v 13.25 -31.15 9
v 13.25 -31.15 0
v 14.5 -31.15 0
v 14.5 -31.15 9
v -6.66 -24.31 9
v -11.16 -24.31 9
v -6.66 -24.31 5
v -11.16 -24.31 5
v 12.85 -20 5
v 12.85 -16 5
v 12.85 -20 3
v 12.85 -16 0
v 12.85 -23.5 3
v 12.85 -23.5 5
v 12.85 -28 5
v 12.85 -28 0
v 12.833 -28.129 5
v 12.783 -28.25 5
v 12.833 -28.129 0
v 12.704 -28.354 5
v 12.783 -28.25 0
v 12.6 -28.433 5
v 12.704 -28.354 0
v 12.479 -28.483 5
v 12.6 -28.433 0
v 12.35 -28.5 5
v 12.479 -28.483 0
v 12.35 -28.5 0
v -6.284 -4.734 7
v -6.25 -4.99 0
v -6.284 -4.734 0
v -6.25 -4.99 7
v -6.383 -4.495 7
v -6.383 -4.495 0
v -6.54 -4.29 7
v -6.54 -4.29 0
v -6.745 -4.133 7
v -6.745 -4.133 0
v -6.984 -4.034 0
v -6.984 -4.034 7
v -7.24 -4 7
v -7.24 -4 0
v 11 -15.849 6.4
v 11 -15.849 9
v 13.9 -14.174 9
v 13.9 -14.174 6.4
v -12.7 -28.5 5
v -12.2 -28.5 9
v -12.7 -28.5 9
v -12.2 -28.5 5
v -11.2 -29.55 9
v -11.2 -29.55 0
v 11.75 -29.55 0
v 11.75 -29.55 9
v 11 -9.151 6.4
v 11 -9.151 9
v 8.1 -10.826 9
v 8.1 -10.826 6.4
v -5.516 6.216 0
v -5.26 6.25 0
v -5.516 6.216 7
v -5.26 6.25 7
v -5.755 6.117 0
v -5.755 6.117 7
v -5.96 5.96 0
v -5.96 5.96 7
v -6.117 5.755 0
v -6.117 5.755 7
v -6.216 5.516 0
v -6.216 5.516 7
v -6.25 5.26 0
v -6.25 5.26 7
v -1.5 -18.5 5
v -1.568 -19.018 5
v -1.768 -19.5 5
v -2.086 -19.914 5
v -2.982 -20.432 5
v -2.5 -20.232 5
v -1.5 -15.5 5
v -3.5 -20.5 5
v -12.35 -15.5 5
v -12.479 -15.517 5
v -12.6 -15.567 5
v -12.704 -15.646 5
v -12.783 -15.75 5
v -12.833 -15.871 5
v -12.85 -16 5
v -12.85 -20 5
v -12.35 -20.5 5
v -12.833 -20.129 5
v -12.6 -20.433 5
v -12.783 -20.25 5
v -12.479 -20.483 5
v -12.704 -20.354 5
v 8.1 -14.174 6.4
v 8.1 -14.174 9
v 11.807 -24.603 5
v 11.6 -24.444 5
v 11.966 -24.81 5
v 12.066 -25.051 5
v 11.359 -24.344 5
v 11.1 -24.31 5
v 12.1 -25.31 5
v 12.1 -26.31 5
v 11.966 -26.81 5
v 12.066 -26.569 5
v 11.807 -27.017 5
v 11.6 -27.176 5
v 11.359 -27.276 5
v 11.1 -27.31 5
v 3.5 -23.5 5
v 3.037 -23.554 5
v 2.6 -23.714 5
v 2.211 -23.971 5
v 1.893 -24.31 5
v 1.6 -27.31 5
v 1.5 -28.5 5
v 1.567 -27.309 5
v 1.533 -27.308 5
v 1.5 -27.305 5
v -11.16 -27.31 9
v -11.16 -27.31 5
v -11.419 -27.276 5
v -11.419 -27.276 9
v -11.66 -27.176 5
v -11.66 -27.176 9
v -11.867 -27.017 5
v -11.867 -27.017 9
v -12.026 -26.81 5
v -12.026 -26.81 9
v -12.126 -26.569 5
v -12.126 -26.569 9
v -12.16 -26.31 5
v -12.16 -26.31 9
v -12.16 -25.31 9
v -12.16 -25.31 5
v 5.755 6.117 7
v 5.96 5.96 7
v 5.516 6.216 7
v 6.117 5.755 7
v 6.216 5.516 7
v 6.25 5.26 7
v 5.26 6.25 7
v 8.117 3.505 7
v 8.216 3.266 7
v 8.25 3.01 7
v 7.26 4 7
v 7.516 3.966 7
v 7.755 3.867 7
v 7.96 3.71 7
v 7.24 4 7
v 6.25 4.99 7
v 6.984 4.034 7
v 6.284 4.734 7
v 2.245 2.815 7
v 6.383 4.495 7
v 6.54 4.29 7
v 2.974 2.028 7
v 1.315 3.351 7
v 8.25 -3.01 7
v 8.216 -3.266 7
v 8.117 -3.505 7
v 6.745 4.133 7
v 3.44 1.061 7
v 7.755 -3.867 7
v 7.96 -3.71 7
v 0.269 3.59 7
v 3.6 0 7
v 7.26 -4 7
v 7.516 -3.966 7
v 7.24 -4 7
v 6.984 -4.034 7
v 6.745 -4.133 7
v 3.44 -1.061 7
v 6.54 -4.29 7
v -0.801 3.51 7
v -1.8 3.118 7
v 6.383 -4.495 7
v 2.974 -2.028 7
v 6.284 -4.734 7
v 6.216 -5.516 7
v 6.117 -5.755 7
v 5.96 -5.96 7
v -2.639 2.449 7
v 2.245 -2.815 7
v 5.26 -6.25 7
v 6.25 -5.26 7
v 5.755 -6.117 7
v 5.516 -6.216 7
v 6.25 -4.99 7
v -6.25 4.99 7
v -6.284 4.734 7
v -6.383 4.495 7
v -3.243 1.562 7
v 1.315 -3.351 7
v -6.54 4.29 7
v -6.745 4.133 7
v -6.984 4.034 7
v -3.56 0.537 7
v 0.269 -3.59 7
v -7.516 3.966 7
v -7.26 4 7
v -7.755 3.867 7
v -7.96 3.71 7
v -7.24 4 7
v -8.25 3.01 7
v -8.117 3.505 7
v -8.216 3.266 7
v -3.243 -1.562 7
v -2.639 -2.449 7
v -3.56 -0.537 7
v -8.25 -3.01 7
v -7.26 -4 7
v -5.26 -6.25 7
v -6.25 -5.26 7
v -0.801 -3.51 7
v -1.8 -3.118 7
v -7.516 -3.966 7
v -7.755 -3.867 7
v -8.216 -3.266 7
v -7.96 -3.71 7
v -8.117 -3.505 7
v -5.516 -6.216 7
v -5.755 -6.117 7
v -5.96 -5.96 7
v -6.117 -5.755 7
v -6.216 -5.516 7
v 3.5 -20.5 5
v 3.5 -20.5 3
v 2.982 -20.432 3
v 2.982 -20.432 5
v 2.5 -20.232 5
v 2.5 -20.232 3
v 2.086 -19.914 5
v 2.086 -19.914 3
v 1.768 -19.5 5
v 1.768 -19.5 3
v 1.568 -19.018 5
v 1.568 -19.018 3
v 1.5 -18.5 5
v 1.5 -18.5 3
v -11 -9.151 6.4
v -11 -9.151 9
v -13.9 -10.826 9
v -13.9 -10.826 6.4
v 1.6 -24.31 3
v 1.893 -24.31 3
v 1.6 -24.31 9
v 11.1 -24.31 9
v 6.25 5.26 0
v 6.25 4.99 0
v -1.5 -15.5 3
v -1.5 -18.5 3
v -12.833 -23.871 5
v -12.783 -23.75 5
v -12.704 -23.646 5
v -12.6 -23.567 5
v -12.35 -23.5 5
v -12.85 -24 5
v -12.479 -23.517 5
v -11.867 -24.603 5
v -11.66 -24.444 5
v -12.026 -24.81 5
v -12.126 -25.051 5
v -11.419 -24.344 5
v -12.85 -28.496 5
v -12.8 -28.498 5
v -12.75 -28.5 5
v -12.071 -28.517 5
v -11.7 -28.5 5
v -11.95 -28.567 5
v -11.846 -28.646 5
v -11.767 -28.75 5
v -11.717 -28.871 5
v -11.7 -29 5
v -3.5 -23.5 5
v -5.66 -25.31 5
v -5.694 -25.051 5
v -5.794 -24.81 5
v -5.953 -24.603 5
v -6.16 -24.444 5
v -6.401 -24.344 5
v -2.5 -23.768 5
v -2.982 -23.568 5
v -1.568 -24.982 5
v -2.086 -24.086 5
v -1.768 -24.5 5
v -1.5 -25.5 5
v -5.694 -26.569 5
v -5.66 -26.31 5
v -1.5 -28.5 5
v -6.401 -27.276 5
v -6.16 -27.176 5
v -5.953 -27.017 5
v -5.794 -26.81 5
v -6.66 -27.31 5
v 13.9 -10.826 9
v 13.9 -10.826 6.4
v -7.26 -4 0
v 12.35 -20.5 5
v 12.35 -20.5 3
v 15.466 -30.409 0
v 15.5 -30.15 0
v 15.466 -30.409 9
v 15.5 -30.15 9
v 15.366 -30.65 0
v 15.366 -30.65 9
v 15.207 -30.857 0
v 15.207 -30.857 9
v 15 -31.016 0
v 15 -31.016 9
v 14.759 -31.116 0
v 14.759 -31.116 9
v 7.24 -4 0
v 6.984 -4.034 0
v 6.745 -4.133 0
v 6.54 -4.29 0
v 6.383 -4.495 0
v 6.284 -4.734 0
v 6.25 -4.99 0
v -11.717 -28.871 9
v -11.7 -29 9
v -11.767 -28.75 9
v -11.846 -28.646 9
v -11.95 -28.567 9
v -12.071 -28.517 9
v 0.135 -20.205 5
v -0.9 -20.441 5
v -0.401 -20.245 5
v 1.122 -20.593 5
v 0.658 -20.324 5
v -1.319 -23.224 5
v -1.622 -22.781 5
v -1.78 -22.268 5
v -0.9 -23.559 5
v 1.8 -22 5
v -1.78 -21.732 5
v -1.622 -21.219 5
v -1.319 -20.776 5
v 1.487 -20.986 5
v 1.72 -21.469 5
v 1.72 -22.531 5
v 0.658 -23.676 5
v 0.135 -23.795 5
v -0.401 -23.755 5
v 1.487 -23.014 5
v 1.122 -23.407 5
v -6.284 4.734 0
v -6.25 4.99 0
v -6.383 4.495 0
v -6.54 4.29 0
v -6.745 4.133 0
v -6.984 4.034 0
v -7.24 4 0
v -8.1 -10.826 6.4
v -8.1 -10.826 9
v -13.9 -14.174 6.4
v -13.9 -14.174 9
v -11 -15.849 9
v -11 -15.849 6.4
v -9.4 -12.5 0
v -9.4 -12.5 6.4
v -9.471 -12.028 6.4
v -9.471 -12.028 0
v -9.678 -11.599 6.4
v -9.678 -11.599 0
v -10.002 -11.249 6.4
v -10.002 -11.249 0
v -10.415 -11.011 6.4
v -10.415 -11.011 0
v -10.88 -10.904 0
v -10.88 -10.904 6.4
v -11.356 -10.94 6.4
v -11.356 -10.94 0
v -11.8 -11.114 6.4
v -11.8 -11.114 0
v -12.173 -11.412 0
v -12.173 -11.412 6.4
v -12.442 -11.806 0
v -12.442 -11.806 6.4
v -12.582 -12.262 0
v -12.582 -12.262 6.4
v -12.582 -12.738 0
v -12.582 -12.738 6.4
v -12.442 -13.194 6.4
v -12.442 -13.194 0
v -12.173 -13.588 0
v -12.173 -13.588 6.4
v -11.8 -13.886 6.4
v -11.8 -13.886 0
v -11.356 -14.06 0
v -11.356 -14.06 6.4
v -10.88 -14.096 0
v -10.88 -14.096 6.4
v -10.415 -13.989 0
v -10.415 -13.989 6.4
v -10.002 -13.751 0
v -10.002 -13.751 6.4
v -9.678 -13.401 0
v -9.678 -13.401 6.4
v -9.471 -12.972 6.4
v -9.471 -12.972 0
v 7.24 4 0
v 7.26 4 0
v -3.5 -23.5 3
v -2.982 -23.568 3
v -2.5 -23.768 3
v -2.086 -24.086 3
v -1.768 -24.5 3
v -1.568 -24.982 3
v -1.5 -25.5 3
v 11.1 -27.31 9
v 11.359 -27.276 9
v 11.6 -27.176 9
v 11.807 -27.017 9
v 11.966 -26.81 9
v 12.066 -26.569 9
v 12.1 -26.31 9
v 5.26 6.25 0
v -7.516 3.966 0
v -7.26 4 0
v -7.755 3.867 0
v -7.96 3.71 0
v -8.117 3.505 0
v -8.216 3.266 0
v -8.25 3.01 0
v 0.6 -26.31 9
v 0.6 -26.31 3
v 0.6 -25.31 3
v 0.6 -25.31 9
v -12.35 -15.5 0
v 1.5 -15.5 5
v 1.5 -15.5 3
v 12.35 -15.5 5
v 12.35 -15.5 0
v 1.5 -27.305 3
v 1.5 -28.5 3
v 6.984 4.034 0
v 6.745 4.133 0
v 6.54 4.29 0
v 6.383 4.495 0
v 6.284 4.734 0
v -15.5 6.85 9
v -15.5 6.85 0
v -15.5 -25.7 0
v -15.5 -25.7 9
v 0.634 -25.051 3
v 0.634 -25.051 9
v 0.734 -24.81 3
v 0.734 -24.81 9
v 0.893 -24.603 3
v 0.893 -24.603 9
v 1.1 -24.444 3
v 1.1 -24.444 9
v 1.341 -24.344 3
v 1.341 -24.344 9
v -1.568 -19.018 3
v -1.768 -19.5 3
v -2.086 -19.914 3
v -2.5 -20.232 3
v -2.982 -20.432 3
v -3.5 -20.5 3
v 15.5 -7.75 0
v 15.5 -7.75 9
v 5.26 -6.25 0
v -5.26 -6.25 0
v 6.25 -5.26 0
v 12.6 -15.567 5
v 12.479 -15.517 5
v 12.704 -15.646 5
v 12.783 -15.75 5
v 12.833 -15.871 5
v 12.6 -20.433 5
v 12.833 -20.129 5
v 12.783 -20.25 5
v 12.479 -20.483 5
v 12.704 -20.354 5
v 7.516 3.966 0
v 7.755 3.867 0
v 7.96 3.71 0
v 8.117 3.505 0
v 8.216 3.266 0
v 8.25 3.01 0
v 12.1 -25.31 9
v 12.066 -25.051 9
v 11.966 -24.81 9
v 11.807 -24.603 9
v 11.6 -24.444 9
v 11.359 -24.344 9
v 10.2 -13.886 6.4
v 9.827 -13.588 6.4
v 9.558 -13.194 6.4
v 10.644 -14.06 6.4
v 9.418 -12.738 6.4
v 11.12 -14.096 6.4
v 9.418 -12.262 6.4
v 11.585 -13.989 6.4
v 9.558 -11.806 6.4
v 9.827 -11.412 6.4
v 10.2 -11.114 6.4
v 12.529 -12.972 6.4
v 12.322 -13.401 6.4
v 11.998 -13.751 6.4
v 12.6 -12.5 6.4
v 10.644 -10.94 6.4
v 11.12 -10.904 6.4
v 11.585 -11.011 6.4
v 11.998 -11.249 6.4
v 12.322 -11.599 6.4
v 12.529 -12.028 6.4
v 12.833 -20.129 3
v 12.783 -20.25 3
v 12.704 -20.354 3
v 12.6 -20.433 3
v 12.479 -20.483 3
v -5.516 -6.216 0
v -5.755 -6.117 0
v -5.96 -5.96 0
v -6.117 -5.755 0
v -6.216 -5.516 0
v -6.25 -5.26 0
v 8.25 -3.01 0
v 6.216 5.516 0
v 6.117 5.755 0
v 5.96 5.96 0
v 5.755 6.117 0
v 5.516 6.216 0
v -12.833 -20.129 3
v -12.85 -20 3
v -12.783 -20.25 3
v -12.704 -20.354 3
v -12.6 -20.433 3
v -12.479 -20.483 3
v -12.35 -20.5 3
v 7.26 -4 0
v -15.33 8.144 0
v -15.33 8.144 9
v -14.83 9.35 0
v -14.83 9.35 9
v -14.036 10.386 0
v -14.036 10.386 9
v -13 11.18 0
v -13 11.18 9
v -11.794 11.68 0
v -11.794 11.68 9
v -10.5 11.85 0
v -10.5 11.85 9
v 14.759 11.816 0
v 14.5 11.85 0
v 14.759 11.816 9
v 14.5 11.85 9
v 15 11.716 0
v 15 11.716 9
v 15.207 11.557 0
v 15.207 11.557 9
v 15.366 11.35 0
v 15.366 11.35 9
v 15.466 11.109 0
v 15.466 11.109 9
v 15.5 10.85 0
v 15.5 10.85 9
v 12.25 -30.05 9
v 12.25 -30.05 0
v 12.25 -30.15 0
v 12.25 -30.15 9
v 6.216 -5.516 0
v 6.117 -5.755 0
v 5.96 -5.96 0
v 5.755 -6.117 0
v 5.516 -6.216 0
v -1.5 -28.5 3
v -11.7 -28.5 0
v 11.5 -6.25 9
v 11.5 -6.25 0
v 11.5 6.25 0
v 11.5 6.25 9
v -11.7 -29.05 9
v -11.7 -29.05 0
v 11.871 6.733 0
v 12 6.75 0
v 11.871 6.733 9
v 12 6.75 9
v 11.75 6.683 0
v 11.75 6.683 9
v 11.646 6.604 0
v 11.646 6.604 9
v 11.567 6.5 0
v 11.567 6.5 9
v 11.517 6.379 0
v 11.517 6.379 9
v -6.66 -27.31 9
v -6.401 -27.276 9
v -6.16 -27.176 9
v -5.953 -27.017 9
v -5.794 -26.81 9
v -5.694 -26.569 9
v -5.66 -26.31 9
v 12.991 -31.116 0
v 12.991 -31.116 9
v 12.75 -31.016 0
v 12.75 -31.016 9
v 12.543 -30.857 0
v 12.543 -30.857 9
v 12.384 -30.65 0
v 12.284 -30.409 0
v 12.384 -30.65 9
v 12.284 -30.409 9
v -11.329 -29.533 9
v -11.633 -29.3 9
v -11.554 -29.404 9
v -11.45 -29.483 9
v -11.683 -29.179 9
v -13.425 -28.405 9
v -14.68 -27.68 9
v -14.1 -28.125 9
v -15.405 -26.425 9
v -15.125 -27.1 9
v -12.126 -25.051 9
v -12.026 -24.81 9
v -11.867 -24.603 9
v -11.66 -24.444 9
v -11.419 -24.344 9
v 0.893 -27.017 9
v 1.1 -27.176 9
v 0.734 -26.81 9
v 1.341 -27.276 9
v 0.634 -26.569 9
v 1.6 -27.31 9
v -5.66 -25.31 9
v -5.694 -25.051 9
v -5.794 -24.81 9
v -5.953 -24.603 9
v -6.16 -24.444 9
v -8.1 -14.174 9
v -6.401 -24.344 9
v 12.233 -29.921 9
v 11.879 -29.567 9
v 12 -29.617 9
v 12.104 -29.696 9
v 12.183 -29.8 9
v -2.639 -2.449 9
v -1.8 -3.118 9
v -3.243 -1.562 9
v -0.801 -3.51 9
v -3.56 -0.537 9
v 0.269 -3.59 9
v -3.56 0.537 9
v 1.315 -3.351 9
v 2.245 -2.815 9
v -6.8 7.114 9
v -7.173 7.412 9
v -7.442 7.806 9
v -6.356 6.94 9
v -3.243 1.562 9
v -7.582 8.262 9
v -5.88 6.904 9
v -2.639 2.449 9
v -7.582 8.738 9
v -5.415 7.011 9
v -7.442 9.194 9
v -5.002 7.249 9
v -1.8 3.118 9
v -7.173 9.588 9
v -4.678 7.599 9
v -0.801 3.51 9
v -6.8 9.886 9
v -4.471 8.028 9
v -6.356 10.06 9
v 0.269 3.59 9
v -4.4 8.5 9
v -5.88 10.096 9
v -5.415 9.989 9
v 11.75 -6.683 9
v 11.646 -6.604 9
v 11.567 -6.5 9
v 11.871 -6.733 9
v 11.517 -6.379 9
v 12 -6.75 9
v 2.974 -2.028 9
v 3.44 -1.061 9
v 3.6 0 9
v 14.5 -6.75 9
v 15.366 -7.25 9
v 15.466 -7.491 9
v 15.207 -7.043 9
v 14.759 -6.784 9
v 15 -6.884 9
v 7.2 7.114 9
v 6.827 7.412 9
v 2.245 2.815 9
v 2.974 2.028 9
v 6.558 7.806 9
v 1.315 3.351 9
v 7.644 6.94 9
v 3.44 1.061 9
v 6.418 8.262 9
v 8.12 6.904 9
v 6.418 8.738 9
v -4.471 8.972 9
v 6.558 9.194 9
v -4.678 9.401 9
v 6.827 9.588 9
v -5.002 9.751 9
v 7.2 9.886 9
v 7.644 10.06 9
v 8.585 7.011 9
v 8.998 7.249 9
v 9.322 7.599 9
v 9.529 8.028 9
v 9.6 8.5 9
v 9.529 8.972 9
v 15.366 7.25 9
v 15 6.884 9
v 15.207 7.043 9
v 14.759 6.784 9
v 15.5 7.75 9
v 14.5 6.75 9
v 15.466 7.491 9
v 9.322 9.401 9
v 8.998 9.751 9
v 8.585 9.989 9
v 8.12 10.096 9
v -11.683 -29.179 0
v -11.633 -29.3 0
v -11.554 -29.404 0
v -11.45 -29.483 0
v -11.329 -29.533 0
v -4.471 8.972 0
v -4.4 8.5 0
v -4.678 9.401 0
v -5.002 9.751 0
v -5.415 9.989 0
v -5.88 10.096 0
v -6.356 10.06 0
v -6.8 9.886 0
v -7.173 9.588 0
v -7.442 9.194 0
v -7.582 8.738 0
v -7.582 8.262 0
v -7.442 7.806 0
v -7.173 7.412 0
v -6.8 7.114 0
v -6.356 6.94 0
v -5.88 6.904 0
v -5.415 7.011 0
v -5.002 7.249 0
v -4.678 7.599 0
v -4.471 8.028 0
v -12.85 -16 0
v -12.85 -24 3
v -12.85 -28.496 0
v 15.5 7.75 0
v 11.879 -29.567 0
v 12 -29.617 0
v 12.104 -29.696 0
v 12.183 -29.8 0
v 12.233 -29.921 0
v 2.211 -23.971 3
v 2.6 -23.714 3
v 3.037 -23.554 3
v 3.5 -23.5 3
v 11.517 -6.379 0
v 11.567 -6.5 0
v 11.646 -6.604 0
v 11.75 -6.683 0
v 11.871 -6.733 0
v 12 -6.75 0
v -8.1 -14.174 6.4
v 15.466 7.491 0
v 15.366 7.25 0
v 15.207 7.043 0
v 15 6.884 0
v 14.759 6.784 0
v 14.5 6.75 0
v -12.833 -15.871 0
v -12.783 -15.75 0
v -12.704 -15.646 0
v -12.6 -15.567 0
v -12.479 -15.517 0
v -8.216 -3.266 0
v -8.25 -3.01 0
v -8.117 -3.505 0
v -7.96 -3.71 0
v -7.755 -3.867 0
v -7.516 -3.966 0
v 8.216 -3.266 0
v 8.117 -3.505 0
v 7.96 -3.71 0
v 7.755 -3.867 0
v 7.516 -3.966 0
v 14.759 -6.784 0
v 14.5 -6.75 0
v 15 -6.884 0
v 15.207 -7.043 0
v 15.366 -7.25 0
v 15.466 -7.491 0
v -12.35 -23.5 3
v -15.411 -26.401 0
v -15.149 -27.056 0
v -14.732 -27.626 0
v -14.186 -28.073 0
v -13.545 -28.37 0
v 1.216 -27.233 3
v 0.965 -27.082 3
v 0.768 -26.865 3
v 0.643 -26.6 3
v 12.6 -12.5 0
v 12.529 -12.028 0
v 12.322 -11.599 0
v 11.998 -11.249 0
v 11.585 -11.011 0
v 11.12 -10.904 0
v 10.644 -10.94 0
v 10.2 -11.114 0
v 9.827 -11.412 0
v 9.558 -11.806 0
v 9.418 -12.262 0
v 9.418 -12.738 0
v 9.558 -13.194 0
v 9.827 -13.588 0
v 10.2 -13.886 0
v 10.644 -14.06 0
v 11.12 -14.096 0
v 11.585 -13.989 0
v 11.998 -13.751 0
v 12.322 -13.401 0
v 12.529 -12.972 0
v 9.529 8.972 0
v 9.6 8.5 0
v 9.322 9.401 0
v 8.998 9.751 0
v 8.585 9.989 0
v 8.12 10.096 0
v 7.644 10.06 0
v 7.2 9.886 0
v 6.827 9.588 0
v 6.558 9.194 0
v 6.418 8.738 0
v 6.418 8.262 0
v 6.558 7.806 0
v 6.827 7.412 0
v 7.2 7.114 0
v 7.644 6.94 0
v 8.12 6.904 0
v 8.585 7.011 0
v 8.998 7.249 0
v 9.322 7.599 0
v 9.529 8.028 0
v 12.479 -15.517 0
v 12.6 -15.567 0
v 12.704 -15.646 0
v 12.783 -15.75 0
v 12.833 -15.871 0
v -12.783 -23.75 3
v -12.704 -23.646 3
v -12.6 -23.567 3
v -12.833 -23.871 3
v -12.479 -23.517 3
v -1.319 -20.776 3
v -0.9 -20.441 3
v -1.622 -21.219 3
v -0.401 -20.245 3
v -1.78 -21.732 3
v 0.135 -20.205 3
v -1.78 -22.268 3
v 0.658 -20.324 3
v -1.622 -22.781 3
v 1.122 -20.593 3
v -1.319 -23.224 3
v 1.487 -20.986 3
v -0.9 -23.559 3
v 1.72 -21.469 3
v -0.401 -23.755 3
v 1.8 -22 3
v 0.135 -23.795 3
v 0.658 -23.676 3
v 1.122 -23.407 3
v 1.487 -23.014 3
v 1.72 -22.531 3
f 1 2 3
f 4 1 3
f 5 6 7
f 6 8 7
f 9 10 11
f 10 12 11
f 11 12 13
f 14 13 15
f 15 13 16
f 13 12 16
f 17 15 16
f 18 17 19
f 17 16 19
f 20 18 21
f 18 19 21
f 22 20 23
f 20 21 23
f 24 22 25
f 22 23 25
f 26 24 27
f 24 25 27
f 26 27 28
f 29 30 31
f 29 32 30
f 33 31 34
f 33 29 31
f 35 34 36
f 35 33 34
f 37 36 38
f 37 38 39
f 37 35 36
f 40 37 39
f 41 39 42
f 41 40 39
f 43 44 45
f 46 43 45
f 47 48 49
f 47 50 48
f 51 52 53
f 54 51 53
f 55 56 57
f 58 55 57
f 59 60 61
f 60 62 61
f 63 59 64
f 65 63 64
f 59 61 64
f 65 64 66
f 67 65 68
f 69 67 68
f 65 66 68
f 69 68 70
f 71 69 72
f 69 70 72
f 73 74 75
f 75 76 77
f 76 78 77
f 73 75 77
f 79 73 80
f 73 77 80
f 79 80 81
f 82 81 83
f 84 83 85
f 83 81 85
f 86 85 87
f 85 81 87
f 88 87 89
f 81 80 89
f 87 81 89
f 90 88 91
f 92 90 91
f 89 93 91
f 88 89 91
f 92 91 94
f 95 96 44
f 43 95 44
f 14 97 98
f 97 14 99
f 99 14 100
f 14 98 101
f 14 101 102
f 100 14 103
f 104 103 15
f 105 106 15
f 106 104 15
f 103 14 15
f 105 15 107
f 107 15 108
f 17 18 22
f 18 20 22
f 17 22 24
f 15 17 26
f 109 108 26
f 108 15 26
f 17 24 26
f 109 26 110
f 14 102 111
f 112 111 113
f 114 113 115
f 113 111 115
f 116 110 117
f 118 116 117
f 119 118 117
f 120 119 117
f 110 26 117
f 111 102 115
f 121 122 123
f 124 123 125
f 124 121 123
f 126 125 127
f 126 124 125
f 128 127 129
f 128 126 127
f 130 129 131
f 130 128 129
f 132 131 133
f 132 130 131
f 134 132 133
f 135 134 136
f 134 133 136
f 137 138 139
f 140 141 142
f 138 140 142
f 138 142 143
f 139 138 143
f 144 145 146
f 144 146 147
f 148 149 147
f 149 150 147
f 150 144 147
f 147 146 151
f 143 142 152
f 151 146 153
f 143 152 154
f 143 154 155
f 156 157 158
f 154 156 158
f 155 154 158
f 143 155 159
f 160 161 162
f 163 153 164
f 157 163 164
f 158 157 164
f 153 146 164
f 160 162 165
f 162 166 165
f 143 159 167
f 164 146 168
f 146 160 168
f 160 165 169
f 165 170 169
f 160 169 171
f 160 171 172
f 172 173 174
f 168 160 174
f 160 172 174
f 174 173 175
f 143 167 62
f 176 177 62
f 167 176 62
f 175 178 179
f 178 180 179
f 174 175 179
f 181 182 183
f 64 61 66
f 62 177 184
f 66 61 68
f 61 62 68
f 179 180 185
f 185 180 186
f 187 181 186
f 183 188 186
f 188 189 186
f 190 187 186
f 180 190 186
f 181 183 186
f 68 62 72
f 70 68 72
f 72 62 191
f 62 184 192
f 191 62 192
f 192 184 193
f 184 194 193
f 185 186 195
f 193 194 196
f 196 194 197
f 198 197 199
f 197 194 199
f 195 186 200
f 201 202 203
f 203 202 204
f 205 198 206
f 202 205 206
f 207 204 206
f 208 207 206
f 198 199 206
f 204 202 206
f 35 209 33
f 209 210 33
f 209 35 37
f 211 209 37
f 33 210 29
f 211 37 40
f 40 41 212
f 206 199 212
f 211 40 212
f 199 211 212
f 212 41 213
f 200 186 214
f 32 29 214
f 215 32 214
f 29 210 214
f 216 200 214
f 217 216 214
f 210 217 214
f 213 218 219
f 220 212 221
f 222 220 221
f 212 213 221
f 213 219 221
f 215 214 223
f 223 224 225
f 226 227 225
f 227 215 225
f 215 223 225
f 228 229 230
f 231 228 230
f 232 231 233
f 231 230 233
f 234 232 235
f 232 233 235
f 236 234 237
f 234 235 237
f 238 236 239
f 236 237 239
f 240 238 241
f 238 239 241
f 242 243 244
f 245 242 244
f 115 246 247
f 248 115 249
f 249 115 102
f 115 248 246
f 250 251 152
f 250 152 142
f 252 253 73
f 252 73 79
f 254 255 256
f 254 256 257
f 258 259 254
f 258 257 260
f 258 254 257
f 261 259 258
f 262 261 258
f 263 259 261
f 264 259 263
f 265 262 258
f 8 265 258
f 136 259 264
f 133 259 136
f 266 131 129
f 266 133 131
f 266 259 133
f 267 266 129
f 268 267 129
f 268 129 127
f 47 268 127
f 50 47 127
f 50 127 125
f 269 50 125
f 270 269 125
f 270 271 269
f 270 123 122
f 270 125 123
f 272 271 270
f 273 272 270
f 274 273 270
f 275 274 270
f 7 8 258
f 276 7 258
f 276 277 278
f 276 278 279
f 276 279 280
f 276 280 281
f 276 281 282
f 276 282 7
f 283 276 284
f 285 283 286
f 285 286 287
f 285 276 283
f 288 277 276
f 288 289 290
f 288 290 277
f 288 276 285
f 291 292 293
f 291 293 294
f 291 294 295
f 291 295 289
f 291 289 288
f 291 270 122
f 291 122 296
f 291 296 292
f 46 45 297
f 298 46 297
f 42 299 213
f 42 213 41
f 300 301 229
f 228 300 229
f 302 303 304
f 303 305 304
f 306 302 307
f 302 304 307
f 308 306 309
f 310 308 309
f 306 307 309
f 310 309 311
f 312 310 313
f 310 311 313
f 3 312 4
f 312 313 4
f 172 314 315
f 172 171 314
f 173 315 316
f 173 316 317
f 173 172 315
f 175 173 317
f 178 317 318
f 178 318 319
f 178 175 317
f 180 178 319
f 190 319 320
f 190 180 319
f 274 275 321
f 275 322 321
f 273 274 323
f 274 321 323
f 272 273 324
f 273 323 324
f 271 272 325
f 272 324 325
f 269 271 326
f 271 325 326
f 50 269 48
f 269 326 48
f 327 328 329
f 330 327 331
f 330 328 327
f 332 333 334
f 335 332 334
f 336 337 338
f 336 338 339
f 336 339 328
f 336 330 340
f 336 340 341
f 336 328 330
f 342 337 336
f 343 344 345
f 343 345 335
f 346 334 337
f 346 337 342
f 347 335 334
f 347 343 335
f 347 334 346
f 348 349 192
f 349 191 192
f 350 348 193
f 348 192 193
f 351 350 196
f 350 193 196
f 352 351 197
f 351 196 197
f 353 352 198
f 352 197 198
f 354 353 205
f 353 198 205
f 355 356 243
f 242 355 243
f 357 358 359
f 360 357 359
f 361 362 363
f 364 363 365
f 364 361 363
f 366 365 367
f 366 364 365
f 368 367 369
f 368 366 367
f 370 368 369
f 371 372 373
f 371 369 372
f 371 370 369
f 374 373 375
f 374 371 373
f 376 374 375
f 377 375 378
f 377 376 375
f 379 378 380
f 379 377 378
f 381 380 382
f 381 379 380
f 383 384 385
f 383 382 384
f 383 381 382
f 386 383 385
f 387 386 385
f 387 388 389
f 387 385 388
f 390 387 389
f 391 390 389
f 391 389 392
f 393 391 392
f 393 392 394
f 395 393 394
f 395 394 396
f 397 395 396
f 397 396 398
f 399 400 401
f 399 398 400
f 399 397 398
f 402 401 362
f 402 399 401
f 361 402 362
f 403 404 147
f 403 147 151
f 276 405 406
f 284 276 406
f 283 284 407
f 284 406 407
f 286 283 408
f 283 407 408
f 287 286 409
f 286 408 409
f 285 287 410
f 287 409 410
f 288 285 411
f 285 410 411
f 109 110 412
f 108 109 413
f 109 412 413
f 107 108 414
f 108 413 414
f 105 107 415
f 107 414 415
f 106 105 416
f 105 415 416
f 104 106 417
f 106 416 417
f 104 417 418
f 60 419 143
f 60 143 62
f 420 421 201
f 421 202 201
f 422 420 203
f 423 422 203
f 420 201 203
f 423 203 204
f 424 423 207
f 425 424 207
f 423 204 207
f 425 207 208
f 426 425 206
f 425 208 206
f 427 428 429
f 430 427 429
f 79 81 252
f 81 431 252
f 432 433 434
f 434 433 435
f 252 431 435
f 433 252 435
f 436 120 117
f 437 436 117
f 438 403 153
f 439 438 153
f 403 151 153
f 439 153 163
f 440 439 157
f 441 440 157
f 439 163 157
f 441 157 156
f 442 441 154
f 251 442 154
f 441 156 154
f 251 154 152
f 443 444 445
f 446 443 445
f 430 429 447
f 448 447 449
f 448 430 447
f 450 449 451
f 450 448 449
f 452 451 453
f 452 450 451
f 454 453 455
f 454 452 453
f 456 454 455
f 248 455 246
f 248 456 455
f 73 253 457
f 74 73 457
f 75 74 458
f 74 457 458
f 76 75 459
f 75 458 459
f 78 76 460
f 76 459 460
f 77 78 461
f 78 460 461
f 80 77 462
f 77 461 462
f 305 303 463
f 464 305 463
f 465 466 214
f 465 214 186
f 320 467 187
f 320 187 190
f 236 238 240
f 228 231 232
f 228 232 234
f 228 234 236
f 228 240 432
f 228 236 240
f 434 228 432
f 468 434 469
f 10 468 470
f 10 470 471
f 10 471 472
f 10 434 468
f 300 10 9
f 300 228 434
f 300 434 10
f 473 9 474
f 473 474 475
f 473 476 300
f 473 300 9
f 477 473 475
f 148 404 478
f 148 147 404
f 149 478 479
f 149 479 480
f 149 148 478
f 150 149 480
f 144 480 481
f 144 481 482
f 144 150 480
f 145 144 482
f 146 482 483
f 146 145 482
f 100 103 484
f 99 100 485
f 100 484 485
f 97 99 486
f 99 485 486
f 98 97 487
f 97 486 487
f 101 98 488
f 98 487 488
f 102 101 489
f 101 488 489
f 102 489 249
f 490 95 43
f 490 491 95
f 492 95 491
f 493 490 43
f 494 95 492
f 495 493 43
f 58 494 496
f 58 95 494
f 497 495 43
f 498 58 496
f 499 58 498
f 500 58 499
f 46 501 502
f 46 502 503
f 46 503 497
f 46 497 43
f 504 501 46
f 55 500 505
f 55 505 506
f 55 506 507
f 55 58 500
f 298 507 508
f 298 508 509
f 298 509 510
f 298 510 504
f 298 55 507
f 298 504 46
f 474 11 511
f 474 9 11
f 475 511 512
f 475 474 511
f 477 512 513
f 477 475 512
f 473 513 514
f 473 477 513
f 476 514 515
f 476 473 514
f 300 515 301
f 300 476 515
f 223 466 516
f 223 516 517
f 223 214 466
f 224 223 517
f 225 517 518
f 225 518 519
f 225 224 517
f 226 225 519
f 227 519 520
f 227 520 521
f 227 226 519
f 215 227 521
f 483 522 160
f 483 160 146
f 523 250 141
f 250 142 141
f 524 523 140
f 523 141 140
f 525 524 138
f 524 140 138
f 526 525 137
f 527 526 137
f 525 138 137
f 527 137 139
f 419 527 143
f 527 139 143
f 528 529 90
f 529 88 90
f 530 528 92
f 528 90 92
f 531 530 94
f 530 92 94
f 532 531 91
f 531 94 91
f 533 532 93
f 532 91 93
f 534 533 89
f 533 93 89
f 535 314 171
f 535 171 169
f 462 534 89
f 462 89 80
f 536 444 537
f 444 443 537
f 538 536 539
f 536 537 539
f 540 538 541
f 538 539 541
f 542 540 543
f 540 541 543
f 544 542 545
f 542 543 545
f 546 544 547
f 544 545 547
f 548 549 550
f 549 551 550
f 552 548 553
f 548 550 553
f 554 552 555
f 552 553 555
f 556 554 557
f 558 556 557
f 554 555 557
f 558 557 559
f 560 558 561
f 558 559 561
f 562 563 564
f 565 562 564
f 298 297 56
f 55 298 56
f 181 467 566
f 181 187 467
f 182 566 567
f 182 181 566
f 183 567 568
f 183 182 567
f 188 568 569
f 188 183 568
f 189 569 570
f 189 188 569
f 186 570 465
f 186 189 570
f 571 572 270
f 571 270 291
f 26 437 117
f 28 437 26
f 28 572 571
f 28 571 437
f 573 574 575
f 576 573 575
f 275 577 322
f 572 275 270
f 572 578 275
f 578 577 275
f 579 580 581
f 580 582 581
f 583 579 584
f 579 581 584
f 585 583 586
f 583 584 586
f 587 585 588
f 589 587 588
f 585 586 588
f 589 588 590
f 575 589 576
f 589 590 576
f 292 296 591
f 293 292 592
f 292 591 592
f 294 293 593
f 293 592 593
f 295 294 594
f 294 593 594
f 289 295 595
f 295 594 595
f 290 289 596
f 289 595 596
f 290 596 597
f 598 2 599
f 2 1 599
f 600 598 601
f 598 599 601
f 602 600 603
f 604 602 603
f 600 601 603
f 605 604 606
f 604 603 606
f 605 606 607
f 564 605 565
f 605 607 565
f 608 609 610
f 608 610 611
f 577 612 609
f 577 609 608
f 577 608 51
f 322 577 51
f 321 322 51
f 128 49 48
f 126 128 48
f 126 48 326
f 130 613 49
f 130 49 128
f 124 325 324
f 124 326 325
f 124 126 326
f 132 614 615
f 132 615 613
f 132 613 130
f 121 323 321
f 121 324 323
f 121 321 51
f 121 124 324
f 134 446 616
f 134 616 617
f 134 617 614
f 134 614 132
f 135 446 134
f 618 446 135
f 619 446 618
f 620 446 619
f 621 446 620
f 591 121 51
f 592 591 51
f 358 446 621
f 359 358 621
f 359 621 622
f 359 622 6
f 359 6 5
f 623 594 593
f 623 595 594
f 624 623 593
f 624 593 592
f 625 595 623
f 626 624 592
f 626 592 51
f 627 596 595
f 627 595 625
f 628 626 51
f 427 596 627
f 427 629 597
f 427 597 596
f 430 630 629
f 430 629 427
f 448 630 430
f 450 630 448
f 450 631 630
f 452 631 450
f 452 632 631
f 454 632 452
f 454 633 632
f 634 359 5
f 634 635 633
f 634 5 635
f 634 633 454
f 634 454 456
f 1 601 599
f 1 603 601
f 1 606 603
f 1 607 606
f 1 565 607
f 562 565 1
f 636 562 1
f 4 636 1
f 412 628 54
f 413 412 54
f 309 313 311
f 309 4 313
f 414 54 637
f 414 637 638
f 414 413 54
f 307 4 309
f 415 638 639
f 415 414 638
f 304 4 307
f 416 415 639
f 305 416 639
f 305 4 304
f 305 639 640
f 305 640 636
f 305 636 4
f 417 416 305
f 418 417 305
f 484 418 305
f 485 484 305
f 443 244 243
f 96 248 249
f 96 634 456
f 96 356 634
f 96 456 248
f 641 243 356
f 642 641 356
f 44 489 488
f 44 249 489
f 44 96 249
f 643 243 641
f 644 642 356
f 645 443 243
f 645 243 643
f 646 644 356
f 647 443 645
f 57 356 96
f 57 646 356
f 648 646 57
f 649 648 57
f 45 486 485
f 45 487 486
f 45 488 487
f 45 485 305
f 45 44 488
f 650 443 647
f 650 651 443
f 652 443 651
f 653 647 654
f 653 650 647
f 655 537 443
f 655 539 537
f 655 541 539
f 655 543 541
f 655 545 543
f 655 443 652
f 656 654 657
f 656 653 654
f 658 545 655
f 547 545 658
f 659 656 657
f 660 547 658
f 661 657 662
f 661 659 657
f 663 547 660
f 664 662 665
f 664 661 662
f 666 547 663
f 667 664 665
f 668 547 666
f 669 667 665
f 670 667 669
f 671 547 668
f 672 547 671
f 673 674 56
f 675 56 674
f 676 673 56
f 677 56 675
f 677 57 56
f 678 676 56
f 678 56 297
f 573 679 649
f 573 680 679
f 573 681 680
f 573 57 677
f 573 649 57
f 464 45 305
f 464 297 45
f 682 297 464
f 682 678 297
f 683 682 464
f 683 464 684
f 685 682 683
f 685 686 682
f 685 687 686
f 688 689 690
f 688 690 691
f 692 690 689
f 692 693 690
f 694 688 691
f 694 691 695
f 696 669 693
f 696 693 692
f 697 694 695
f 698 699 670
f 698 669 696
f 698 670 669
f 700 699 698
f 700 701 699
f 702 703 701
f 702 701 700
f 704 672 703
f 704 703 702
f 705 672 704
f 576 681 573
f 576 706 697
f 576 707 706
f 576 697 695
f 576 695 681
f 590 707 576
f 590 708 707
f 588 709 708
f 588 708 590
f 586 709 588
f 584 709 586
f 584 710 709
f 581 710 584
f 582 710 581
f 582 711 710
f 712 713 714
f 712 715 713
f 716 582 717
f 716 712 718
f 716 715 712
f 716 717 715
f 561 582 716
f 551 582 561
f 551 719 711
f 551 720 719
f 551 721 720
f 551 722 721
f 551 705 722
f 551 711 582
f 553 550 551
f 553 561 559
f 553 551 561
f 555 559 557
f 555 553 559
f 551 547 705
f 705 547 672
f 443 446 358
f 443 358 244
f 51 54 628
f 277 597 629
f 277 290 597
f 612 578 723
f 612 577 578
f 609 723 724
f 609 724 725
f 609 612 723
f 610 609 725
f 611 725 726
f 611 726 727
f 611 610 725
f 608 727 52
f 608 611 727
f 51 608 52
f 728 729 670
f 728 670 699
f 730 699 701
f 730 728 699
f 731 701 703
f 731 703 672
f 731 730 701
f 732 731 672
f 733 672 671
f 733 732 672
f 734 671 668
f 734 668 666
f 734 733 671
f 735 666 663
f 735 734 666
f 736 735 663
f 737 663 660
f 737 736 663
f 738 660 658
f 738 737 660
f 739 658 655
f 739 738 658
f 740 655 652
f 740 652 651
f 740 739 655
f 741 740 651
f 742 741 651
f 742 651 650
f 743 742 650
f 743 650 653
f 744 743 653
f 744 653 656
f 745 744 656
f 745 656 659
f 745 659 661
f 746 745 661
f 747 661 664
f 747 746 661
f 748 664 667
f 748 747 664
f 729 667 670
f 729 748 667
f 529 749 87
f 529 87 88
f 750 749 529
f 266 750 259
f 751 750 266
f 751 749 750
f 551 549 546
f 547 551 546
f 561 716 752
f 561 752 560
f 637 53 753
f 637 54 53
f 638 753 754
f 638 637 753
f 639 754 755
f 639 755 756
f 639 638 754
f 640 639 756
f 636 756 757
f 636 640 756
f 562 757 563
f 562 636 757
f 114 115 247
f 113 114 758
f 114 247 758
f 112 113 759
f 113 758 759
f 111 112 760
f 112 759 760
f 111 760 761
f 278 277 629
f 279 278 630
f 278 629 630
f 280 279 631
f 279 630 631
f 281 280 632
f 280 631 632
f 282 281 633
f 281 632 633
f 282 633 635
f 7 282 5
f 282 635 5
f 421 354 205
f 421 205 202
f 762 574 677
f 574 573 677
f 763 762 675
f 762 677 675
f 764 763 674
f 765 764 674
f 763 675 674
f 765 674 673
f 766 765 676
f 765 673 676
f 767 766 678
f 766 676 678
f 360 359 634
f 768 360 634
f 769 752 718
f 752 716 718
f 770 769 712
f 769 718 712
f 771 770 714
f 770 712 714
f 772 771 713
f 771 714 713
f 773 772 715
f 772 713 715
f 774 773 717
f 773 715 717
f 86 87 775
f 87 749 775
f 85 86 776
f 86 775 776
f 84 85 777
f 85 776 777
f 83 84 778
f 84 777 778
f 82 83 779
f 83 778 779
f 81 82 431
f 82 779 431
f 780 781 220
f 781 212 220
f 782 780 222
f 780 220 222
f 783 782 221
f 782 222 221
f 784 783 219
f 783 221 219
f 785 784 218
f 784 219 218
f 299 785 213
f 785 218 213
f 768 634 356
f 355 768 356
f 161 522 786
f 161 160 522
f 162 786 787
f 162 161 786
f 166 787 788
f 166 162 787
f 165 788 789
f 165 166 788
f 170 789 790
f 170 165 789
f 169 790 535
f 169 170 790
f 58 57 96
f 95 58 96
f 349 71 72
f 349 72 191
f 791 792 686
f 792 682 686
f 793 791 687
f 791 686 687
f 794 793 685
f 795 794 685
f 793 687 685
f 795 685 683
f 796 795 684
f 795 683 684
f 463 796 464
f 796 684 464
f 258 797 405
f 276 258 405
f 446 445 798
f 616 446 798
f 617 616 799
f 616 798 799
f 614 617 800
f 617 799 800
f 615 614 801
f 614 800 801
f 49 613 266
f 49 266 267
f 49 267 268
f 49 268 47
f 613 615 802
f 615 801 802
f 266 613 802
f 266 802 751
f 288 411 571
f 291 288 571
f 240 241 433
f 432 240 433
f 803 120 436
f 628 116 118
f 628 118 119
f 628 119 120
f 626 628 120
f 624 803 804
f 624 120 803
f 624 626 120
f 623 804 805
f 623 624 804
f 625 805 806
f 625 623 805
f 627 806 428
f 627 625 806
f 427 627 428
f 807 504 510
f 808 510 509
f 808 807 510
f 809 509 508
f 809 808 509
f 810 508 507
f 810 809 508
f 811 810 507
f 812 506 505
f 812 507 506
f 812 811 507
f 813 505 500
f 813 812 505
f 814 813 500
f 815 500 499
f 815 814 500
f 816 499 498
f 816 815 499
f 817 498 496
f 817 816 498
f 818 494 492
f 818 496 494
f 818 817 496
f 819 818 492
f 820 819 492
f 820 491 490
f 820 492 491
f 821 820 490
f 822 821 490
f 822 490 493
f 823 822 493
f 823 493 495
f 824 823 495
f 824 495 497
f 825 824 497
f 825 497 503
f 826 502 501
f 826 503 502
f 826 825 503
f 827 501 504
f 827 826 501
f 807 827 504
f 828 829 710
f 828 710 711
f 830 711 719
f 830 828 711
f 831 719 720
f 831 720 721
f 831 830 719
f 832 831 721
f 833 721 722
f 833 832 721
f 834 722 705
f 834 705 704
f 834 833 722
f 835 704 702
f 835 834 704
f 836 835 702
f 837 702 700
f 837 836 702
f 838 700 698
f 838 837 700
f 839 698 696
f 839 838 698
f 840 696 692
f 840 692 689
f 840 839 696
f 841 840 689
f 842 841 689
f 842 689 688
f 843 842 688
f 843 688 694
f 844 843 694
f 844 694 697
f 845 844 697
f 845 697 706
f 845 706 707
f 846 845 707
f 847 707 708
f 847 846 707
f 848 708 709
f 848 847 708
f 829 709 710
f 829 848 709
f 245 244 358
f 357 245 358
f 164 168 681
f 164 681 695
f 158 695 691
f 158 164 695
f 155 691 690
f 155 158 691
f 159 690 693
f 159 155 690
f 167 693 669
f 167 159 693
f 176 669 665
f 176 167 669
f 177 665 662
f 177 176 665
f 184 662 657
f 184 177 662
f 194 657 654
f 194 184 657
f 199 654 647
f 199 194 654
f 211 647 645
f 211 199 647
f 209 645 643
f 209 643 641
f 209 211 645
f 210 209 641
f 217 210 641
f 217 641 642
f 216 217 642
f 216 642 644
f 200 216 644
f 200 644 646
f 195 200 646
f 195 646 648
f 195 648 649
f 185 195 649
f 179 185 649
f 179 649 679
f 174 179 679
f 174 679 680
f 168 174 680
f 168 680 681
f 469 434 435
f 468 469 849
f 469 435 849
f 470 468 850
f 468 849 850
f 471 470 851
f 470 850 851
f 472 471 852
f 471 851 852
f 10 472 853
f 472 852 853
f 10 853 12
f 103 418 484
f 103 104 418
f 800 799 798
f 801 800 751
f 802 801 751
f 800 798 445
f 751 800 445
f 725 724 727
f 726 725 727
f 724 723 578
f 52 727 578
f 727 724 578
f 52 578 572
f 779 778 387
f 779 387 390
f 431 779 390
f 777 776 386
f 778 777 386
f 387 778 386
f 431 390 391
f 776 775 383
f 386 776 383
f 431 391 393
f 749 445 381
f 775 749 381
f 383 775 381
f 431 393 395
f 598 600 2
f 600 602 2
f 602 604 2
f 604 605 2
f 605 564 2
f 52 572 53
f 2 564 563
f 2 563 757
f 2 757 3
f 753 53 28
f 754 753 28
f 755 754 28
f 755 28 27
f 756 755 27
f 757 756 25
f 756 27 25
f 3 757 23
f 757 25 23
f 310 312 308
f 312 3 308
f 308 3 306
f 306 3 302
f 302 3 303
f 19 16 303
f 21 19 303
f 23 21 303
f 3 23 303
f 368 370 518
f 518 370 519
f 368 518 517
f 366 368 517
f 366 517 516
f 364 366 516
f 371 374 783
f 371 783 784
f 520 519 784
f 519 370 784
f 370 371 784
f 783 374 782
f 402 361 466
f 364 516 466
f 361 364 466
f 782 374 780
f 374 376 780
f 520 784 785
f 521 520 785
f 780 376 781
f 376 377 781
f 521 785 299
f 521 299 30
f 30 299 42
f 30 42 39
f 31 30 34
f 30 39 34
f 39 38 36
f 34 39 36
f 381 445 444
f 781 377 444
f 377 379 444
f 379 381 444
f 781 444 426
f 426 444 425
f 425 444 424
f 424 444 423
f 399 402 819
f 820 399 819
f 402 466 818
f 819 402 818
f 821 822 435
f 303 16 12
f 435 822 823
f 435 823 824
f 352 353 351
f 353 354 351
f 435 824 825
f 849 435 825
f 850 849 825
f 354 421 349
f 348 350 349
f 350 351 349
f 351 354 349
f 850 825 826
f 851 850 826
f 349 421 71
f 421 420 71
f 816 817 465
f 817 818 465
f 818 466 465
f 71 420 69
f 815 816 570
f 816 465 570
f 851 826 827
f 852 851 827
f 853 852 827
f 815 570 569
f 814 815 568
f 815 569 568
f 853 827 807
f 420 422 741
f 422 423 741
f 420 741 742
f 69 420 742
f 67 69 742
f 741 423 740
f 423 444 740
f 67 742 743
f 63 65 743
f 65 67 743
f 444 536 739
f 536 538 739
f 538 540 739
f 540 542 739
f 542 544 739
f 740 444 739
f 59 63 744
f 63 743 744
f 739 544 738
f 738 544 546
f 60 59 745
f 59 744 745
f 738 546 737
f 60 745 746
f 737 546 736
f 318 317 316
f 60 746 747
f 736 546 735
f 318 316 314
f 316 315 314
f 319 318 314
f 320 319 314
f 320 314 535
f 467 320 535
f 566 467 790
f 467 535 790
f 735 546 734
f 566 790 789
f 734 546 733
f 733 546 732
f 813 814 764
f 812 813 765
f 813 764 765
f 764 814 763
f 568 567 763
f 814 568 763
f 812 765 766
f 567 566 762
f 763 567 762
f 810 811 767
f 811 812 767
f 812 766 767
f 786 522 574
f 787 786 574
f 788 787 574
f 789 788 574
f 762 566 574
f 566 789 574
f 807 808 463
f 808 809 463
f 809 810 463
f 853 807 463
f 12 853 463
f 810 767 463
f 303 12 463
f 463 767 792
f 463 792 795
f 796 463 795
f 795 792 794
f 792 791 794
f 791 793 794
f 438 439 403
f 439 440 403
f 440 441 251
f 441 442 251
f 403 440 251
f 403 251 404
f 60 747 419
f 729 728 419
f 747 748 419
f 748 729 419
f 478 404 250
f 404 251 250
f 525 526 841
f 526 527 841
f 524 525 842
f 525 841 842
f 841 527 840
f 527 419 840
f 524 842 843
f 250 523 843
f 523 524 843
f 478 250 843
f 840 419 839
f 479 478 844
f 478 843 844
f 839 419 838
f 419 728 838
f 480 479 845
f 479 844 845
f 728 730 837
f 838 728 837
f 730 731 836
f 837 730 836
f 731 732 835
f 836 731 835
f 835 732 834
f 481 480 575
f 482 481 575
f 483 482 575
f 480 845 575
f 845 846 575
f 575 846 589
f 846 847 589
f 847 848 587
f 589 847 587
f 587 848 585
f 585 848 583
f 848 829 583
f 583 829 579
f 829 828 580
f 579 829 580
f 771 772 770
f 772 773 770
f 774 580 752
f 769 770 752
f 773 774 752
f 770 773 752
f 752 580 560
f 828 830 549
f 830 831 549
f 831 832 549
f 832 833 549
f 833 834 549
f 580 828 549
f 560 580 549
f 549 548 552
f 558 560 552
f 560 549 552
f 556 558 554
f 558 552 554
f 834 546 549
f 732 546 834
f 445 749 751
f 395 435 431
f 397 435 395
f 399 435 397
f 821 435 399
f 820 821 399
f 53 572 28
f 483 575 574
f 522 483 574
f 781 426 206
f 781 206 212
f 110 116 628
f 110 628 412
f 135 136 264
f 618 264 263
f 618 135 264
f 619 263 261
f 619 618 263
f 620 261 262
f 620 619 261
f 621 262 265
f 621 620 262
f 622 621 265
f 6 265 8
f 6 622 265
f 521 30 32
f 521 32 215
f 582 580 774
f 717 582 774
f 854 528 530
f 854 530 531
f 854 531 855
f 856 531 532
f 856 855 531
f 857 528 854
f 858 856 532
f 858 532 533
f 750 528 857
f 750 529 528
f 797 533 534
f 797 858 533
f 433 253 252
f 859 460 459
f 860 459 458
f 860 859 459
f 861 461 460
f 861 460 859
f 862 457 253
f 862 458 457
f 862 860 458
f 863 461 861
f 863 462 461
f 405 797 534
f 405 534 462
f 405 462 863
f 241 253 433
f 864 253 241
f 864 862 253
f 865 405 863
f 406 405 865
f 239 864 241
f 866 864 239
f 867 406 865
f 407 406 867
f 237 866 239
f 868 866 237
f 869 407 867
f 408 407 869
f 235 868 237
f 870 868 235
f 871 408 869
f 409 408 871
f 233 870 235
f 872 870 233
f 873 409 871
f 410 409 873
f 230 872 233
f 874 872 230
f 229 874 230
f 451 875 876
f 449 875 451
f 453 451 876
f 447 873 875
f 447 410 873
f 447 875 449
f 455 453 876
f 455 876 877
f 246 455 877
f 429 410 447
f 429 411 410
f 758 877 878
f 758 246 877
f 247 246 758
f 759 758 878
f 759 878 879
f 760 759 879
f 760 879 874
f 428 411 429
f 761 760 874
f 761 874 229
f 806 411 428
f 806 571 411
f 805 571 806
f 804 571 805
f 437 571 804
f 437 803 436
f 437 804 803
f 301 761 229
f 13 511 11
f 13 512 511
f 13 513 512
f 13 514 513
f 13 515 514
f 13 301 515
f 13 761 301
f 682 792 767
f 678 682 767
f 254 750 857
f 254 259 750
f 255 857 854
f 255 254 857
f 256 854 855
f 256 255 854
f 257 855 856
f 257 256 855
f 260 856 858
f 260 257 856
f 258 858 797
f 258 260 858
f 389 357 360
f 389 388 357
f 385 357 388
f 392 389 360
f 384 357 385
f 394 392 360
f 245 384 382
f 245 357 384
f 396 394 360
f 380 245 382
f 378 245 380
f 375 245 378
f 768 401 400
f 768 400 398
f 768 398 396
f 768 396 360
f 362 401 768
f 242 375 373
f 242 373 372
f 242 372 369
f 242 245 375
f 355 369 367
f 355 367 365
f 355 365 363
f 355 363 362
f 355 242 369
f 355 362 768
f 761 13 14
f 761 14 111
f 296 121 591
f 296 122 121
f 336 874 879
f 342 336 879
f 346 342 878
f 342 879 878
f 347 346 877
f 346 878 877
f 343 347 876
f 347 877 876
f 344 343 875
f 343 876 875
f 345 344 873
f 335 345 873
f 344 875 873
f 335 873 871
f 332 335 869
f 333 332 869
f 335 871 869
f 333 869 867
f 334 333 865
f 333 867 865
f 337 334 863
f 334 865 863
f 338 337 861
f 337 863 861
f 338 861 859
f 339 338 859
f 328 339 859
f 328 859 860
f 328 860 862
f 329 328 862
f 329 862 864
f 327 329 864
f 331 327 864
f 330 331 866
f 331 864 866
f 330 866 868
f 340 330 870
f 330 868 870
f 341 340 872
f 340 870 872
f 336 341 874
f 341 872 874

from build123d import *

# Parameters (mm, degrees)
SKETCH_R        = 3.6
SKETCH_R_2      = 1.6
SKETCH_W        = 6.5
SKETCH_H        = 3
SKETCH_W_2      = 11.5
PAD_DEPTH       = 9
POCKET_DEPTH    = 2.6
POCKET001_DEPTH = 7
SKETCH003_W     = 25.7
SKETCH003_H     = 13
POCKET002_DEPTH = 3
SKETCH004_R     = 1.8
POCKET003_DEPTH = 2
FILLET_R        = 5
FILLET001_R     = 0.99
FILLET002_R     = 1
FILLET003_R     = 0.5


with BuildPart() as part:
    # Sketch → Pad (new body)
    with BuildSketch(Plane.XY):
        with BuildLine():
            Line((15.5, -31.15), (15.5, -6.75))
            Line((15.5, -6.75), (11.5, -6.75))
            Line((11.5, -6.75), (11.5, 6.75))
            Line((11.5, 6.75), (15.5, 6.75))
            Line((15.5, 6.75), (15.5, 11.85))
            Line((15.5, 11.85), (-15.5, 11.85))
            Line((-15.5, 11.85), (-15.5, -25.7))
            ThreePointArc((-15.5, -25.7), (-14.679899, -27.679899), (-12.7, -28.5))
            Line((-11.7, -28.5), (-12.7, -28.5))
            Line((-11.7, -29.55), (-11.7, -28.5))
            Line((-11.7, -29.55), (12.25, -29.55))
            Line((12.25, -29.55), (12.25, -31.15))
            Line((12.25, -31.15), (15.5, -31.15))
        make_face()
        Circle(SKETCH_R, mode=Mode.SUBTRACT)
        with Locations((-11, -12.5)):
            Circle(SKETCH_R_2, mode=Mode.SUBTRACT)
        with Locations((11, -12.5)):
            Circle(SKETCH_R_2, mode=Mode.SUBTRACT)
        with Locations((-6, 8.5)):
            Circle(SKETCH_R_2, mode=Mode.SUBTRACT)
        with Locations((8, 8.5)):
            Circle(SKETCH_R_2, mode=Mode.SUBTRACT)
        with Locations((-8.91, -25.81)):
            Rectangle(SKETCH_W, SKETCH_H, mode=Mode.SUBTRACT)
        with Locations((6.35, -25.81)):
            Rectangle(SKETCH_W_2, SKETCH_H, mode=Mode.SUBTRACT)
    extrude(amount=PAD_DEPTH)

    # Sketch001 (on Face28 of Pad) → Pocket (cut)
    with BuildSketch(Plane.XY.offset(9)):
        Polygon((-8.1, -14.174316), (-8.1, -10.825684), (-11, -9.151368), (-13.9, -10.825684), (-13.9, -14.174316), (-11, -15.848632), align=None)
        Polygon((13.9, -14.174316), (13.9, -10.825684), (11, -9.151368), (8.1, -10.825684), (8.1, -14.174316), (11, -15.848632), align=None)
    extrude(amount=-POCKET_DEPTH, mode=Mode.SUBTRACT)

    # Sketch002 → Pocket001 (cut)
    with BuildSketch(Plane(origin=(0, 0, 0), x_dir=(1, 0, 0), z_dir=(0, 0, -1))):
        Polygon((8.25, -4), (6.25, -4), (6.25, -6.25), (-6.25, -6.25), (-6.25, -4), (-8.25, -4), (-8.25, 4), (-6.25, 4), (-6.25, 6.25), (6.25, 6.25), (6.25, 4), (8.25, 4), align=None)
    extrude(amount=-POCKET001_DEPTH, mode=Mode.SUBTRACT)

    # Sketch003 → Pocket002 (cut)
    with BuildSketch(Plane(origin=(0, 0, 0), x_dir=(1, 0, 0), z_dir=(0, 0, -1))):
        with Locations((0, 22)):
            Rectangle(SKETCH003_W, SKETCH003_H)
    extrude(amount=-POCKET002_DEPTH, mode=Mode.SUBTRACT)

    # Sketch004 (on Face57 of Pocket002) → Pocket003 (cut)
    with BuildSketch(Plane(origin=(0, 0, 3), x_dir=(1, 0, 0), z_dir=(0, 0, -1))):
        with Locations((0, 22)):
            Circle(SKETCH004_R)
        with BuildLine():
            Line((1.5, 15.5), (12.85, 15.5))
            Line((12.85, 15.5), (12.85, 20.5))
            Line((12.85, 20.5), (3.5, 20.5))
            ThreePointArc((3.5, 20.5), (2.085786, 19.914214), (1.5, 18.5))
            Line((1.5, 18.5), (1.5, 15.5))
        make_face()
        with BuildLine():
            Line((-1.5, 15.5), (-12.85, 15.5))
            Line((-12.85, 15.5), (-12.85, 20.5))
            Line((-12.85, 20.5), (-3.5, 20.5))
            ThreePointArc((-1.5, 18.5), (-2.085786, 19.914214), (-3.5, 20.5))
            Line((-1.5, 18.5), (-1.5, 15.5))
        make_face()
        with BuildLine():
            Line((12.85, 23.5), (3.5, 23.5))
            ThreePointArc((1.5, 25.5), (2.085786, 24.085786), (3.5, 23.5))
            Line((1.5, 25.5), (1.5, 28.5))
            Line((1.5, 28.5), (12.85, 28.5))
            Line((12.85, 28.5), (12.85, 23.5))
        make_face()
        with BuildLine():
            Line((-12.85, 23.5), (-3.5, 23.5))
            ThreePointArc((-3.5, 23.5), (-2.085786, 24.085786), (-1.5, 25.5))
            Line((-1.5, 25.5), (-1.5, 28.5))
            Line((-1.5, 28.5), (-12.85, 28.5))
            Line((-12.85, 28.5), (-12.85, 23.5))
        make_face()
    extrude(amount=-POCKET003_DEPTH, mode=Mode.SUBTRACT)

    # Fillet
    fillet_edges = [part.edges().sort_by_distance(p)[0] for p in [
        (-15.5, 11.85, 4.5),
    ]]
    fillet(fillet_edges, radius=FILLET_R)

    # Fillet001
    fillet001_edges = [part.edges().sort_by_distance(p)[0] for p in [
        (6.25, 6.25, 3.5),
        (-6.25, 6.25, 3.5),
        (-6.25, 4, 3.5),
        (-8.25, 4, 3.5),
        (6.25, 4, 3.5),
        (8.25, 4, 3.5),
        (8.25, -4, 3.5),
        (6.25, -4, 3.5),
        (6.25, -6.25, 3.5),
        (-6.25, -6.25, 3.5),
        (-6.25, -4, 3.5),
        (-8.25, -4, 3.5),
    ]]
    fillet(fillet001_edges, radius=FILLET001_R)

    # Fillet002
    fillet002_edges = [part.edges().sort_by_distance(p)[0] for p in [
        (15.5, 11.85, 4.5),
        (15.5, 6.75, 4.5),
        (15.5, -6.75, 4.5),
        (15.5, -31.15, 4.5),
        (12.25, -31.15, 4.5),
        (12.1, -24.31, 7),
        (0.6, -24.31, 6),
        (12.1, -27.31, 7),
        (0.6, -27.31, 6),
        (-12.16, -24.31, 7),
        (-5.66, -24.31, 7),
        (-5.66, -27.31, 7),
        (-12.16, -27.31, 7),
    ]]
    fillet(fillet002_edges, radius=FILLET002_R)

    # Fillet003
    fillet003_edges = [part.edges().sort_by_distance(p)[0] for p in [
        (11.5, 6.75, 4.5),
        (11.5, -6.75, 4.5),
        (12.85, -15.5, 4),
        (12.85, -15.5, 1.5),
        (12.85, -20.5, 4),
        (-12.85, -15.5, 4),
        (-12.85, -15.5, 1.5),
        (-12.85, -23.5, 4),
        (-12.85, -20.5, 4),
        (-11.7, -29.55, 4.5),
        (12.85, -28.5, 1.5),
        (12.85, -28.5, 4),
        (12.25, -29.55, 4.5),
        (-11.7, -28.5, 7),
    ]]
    fillet(fillet003_edges, radius=FILLET003_R)


solid = part.part
